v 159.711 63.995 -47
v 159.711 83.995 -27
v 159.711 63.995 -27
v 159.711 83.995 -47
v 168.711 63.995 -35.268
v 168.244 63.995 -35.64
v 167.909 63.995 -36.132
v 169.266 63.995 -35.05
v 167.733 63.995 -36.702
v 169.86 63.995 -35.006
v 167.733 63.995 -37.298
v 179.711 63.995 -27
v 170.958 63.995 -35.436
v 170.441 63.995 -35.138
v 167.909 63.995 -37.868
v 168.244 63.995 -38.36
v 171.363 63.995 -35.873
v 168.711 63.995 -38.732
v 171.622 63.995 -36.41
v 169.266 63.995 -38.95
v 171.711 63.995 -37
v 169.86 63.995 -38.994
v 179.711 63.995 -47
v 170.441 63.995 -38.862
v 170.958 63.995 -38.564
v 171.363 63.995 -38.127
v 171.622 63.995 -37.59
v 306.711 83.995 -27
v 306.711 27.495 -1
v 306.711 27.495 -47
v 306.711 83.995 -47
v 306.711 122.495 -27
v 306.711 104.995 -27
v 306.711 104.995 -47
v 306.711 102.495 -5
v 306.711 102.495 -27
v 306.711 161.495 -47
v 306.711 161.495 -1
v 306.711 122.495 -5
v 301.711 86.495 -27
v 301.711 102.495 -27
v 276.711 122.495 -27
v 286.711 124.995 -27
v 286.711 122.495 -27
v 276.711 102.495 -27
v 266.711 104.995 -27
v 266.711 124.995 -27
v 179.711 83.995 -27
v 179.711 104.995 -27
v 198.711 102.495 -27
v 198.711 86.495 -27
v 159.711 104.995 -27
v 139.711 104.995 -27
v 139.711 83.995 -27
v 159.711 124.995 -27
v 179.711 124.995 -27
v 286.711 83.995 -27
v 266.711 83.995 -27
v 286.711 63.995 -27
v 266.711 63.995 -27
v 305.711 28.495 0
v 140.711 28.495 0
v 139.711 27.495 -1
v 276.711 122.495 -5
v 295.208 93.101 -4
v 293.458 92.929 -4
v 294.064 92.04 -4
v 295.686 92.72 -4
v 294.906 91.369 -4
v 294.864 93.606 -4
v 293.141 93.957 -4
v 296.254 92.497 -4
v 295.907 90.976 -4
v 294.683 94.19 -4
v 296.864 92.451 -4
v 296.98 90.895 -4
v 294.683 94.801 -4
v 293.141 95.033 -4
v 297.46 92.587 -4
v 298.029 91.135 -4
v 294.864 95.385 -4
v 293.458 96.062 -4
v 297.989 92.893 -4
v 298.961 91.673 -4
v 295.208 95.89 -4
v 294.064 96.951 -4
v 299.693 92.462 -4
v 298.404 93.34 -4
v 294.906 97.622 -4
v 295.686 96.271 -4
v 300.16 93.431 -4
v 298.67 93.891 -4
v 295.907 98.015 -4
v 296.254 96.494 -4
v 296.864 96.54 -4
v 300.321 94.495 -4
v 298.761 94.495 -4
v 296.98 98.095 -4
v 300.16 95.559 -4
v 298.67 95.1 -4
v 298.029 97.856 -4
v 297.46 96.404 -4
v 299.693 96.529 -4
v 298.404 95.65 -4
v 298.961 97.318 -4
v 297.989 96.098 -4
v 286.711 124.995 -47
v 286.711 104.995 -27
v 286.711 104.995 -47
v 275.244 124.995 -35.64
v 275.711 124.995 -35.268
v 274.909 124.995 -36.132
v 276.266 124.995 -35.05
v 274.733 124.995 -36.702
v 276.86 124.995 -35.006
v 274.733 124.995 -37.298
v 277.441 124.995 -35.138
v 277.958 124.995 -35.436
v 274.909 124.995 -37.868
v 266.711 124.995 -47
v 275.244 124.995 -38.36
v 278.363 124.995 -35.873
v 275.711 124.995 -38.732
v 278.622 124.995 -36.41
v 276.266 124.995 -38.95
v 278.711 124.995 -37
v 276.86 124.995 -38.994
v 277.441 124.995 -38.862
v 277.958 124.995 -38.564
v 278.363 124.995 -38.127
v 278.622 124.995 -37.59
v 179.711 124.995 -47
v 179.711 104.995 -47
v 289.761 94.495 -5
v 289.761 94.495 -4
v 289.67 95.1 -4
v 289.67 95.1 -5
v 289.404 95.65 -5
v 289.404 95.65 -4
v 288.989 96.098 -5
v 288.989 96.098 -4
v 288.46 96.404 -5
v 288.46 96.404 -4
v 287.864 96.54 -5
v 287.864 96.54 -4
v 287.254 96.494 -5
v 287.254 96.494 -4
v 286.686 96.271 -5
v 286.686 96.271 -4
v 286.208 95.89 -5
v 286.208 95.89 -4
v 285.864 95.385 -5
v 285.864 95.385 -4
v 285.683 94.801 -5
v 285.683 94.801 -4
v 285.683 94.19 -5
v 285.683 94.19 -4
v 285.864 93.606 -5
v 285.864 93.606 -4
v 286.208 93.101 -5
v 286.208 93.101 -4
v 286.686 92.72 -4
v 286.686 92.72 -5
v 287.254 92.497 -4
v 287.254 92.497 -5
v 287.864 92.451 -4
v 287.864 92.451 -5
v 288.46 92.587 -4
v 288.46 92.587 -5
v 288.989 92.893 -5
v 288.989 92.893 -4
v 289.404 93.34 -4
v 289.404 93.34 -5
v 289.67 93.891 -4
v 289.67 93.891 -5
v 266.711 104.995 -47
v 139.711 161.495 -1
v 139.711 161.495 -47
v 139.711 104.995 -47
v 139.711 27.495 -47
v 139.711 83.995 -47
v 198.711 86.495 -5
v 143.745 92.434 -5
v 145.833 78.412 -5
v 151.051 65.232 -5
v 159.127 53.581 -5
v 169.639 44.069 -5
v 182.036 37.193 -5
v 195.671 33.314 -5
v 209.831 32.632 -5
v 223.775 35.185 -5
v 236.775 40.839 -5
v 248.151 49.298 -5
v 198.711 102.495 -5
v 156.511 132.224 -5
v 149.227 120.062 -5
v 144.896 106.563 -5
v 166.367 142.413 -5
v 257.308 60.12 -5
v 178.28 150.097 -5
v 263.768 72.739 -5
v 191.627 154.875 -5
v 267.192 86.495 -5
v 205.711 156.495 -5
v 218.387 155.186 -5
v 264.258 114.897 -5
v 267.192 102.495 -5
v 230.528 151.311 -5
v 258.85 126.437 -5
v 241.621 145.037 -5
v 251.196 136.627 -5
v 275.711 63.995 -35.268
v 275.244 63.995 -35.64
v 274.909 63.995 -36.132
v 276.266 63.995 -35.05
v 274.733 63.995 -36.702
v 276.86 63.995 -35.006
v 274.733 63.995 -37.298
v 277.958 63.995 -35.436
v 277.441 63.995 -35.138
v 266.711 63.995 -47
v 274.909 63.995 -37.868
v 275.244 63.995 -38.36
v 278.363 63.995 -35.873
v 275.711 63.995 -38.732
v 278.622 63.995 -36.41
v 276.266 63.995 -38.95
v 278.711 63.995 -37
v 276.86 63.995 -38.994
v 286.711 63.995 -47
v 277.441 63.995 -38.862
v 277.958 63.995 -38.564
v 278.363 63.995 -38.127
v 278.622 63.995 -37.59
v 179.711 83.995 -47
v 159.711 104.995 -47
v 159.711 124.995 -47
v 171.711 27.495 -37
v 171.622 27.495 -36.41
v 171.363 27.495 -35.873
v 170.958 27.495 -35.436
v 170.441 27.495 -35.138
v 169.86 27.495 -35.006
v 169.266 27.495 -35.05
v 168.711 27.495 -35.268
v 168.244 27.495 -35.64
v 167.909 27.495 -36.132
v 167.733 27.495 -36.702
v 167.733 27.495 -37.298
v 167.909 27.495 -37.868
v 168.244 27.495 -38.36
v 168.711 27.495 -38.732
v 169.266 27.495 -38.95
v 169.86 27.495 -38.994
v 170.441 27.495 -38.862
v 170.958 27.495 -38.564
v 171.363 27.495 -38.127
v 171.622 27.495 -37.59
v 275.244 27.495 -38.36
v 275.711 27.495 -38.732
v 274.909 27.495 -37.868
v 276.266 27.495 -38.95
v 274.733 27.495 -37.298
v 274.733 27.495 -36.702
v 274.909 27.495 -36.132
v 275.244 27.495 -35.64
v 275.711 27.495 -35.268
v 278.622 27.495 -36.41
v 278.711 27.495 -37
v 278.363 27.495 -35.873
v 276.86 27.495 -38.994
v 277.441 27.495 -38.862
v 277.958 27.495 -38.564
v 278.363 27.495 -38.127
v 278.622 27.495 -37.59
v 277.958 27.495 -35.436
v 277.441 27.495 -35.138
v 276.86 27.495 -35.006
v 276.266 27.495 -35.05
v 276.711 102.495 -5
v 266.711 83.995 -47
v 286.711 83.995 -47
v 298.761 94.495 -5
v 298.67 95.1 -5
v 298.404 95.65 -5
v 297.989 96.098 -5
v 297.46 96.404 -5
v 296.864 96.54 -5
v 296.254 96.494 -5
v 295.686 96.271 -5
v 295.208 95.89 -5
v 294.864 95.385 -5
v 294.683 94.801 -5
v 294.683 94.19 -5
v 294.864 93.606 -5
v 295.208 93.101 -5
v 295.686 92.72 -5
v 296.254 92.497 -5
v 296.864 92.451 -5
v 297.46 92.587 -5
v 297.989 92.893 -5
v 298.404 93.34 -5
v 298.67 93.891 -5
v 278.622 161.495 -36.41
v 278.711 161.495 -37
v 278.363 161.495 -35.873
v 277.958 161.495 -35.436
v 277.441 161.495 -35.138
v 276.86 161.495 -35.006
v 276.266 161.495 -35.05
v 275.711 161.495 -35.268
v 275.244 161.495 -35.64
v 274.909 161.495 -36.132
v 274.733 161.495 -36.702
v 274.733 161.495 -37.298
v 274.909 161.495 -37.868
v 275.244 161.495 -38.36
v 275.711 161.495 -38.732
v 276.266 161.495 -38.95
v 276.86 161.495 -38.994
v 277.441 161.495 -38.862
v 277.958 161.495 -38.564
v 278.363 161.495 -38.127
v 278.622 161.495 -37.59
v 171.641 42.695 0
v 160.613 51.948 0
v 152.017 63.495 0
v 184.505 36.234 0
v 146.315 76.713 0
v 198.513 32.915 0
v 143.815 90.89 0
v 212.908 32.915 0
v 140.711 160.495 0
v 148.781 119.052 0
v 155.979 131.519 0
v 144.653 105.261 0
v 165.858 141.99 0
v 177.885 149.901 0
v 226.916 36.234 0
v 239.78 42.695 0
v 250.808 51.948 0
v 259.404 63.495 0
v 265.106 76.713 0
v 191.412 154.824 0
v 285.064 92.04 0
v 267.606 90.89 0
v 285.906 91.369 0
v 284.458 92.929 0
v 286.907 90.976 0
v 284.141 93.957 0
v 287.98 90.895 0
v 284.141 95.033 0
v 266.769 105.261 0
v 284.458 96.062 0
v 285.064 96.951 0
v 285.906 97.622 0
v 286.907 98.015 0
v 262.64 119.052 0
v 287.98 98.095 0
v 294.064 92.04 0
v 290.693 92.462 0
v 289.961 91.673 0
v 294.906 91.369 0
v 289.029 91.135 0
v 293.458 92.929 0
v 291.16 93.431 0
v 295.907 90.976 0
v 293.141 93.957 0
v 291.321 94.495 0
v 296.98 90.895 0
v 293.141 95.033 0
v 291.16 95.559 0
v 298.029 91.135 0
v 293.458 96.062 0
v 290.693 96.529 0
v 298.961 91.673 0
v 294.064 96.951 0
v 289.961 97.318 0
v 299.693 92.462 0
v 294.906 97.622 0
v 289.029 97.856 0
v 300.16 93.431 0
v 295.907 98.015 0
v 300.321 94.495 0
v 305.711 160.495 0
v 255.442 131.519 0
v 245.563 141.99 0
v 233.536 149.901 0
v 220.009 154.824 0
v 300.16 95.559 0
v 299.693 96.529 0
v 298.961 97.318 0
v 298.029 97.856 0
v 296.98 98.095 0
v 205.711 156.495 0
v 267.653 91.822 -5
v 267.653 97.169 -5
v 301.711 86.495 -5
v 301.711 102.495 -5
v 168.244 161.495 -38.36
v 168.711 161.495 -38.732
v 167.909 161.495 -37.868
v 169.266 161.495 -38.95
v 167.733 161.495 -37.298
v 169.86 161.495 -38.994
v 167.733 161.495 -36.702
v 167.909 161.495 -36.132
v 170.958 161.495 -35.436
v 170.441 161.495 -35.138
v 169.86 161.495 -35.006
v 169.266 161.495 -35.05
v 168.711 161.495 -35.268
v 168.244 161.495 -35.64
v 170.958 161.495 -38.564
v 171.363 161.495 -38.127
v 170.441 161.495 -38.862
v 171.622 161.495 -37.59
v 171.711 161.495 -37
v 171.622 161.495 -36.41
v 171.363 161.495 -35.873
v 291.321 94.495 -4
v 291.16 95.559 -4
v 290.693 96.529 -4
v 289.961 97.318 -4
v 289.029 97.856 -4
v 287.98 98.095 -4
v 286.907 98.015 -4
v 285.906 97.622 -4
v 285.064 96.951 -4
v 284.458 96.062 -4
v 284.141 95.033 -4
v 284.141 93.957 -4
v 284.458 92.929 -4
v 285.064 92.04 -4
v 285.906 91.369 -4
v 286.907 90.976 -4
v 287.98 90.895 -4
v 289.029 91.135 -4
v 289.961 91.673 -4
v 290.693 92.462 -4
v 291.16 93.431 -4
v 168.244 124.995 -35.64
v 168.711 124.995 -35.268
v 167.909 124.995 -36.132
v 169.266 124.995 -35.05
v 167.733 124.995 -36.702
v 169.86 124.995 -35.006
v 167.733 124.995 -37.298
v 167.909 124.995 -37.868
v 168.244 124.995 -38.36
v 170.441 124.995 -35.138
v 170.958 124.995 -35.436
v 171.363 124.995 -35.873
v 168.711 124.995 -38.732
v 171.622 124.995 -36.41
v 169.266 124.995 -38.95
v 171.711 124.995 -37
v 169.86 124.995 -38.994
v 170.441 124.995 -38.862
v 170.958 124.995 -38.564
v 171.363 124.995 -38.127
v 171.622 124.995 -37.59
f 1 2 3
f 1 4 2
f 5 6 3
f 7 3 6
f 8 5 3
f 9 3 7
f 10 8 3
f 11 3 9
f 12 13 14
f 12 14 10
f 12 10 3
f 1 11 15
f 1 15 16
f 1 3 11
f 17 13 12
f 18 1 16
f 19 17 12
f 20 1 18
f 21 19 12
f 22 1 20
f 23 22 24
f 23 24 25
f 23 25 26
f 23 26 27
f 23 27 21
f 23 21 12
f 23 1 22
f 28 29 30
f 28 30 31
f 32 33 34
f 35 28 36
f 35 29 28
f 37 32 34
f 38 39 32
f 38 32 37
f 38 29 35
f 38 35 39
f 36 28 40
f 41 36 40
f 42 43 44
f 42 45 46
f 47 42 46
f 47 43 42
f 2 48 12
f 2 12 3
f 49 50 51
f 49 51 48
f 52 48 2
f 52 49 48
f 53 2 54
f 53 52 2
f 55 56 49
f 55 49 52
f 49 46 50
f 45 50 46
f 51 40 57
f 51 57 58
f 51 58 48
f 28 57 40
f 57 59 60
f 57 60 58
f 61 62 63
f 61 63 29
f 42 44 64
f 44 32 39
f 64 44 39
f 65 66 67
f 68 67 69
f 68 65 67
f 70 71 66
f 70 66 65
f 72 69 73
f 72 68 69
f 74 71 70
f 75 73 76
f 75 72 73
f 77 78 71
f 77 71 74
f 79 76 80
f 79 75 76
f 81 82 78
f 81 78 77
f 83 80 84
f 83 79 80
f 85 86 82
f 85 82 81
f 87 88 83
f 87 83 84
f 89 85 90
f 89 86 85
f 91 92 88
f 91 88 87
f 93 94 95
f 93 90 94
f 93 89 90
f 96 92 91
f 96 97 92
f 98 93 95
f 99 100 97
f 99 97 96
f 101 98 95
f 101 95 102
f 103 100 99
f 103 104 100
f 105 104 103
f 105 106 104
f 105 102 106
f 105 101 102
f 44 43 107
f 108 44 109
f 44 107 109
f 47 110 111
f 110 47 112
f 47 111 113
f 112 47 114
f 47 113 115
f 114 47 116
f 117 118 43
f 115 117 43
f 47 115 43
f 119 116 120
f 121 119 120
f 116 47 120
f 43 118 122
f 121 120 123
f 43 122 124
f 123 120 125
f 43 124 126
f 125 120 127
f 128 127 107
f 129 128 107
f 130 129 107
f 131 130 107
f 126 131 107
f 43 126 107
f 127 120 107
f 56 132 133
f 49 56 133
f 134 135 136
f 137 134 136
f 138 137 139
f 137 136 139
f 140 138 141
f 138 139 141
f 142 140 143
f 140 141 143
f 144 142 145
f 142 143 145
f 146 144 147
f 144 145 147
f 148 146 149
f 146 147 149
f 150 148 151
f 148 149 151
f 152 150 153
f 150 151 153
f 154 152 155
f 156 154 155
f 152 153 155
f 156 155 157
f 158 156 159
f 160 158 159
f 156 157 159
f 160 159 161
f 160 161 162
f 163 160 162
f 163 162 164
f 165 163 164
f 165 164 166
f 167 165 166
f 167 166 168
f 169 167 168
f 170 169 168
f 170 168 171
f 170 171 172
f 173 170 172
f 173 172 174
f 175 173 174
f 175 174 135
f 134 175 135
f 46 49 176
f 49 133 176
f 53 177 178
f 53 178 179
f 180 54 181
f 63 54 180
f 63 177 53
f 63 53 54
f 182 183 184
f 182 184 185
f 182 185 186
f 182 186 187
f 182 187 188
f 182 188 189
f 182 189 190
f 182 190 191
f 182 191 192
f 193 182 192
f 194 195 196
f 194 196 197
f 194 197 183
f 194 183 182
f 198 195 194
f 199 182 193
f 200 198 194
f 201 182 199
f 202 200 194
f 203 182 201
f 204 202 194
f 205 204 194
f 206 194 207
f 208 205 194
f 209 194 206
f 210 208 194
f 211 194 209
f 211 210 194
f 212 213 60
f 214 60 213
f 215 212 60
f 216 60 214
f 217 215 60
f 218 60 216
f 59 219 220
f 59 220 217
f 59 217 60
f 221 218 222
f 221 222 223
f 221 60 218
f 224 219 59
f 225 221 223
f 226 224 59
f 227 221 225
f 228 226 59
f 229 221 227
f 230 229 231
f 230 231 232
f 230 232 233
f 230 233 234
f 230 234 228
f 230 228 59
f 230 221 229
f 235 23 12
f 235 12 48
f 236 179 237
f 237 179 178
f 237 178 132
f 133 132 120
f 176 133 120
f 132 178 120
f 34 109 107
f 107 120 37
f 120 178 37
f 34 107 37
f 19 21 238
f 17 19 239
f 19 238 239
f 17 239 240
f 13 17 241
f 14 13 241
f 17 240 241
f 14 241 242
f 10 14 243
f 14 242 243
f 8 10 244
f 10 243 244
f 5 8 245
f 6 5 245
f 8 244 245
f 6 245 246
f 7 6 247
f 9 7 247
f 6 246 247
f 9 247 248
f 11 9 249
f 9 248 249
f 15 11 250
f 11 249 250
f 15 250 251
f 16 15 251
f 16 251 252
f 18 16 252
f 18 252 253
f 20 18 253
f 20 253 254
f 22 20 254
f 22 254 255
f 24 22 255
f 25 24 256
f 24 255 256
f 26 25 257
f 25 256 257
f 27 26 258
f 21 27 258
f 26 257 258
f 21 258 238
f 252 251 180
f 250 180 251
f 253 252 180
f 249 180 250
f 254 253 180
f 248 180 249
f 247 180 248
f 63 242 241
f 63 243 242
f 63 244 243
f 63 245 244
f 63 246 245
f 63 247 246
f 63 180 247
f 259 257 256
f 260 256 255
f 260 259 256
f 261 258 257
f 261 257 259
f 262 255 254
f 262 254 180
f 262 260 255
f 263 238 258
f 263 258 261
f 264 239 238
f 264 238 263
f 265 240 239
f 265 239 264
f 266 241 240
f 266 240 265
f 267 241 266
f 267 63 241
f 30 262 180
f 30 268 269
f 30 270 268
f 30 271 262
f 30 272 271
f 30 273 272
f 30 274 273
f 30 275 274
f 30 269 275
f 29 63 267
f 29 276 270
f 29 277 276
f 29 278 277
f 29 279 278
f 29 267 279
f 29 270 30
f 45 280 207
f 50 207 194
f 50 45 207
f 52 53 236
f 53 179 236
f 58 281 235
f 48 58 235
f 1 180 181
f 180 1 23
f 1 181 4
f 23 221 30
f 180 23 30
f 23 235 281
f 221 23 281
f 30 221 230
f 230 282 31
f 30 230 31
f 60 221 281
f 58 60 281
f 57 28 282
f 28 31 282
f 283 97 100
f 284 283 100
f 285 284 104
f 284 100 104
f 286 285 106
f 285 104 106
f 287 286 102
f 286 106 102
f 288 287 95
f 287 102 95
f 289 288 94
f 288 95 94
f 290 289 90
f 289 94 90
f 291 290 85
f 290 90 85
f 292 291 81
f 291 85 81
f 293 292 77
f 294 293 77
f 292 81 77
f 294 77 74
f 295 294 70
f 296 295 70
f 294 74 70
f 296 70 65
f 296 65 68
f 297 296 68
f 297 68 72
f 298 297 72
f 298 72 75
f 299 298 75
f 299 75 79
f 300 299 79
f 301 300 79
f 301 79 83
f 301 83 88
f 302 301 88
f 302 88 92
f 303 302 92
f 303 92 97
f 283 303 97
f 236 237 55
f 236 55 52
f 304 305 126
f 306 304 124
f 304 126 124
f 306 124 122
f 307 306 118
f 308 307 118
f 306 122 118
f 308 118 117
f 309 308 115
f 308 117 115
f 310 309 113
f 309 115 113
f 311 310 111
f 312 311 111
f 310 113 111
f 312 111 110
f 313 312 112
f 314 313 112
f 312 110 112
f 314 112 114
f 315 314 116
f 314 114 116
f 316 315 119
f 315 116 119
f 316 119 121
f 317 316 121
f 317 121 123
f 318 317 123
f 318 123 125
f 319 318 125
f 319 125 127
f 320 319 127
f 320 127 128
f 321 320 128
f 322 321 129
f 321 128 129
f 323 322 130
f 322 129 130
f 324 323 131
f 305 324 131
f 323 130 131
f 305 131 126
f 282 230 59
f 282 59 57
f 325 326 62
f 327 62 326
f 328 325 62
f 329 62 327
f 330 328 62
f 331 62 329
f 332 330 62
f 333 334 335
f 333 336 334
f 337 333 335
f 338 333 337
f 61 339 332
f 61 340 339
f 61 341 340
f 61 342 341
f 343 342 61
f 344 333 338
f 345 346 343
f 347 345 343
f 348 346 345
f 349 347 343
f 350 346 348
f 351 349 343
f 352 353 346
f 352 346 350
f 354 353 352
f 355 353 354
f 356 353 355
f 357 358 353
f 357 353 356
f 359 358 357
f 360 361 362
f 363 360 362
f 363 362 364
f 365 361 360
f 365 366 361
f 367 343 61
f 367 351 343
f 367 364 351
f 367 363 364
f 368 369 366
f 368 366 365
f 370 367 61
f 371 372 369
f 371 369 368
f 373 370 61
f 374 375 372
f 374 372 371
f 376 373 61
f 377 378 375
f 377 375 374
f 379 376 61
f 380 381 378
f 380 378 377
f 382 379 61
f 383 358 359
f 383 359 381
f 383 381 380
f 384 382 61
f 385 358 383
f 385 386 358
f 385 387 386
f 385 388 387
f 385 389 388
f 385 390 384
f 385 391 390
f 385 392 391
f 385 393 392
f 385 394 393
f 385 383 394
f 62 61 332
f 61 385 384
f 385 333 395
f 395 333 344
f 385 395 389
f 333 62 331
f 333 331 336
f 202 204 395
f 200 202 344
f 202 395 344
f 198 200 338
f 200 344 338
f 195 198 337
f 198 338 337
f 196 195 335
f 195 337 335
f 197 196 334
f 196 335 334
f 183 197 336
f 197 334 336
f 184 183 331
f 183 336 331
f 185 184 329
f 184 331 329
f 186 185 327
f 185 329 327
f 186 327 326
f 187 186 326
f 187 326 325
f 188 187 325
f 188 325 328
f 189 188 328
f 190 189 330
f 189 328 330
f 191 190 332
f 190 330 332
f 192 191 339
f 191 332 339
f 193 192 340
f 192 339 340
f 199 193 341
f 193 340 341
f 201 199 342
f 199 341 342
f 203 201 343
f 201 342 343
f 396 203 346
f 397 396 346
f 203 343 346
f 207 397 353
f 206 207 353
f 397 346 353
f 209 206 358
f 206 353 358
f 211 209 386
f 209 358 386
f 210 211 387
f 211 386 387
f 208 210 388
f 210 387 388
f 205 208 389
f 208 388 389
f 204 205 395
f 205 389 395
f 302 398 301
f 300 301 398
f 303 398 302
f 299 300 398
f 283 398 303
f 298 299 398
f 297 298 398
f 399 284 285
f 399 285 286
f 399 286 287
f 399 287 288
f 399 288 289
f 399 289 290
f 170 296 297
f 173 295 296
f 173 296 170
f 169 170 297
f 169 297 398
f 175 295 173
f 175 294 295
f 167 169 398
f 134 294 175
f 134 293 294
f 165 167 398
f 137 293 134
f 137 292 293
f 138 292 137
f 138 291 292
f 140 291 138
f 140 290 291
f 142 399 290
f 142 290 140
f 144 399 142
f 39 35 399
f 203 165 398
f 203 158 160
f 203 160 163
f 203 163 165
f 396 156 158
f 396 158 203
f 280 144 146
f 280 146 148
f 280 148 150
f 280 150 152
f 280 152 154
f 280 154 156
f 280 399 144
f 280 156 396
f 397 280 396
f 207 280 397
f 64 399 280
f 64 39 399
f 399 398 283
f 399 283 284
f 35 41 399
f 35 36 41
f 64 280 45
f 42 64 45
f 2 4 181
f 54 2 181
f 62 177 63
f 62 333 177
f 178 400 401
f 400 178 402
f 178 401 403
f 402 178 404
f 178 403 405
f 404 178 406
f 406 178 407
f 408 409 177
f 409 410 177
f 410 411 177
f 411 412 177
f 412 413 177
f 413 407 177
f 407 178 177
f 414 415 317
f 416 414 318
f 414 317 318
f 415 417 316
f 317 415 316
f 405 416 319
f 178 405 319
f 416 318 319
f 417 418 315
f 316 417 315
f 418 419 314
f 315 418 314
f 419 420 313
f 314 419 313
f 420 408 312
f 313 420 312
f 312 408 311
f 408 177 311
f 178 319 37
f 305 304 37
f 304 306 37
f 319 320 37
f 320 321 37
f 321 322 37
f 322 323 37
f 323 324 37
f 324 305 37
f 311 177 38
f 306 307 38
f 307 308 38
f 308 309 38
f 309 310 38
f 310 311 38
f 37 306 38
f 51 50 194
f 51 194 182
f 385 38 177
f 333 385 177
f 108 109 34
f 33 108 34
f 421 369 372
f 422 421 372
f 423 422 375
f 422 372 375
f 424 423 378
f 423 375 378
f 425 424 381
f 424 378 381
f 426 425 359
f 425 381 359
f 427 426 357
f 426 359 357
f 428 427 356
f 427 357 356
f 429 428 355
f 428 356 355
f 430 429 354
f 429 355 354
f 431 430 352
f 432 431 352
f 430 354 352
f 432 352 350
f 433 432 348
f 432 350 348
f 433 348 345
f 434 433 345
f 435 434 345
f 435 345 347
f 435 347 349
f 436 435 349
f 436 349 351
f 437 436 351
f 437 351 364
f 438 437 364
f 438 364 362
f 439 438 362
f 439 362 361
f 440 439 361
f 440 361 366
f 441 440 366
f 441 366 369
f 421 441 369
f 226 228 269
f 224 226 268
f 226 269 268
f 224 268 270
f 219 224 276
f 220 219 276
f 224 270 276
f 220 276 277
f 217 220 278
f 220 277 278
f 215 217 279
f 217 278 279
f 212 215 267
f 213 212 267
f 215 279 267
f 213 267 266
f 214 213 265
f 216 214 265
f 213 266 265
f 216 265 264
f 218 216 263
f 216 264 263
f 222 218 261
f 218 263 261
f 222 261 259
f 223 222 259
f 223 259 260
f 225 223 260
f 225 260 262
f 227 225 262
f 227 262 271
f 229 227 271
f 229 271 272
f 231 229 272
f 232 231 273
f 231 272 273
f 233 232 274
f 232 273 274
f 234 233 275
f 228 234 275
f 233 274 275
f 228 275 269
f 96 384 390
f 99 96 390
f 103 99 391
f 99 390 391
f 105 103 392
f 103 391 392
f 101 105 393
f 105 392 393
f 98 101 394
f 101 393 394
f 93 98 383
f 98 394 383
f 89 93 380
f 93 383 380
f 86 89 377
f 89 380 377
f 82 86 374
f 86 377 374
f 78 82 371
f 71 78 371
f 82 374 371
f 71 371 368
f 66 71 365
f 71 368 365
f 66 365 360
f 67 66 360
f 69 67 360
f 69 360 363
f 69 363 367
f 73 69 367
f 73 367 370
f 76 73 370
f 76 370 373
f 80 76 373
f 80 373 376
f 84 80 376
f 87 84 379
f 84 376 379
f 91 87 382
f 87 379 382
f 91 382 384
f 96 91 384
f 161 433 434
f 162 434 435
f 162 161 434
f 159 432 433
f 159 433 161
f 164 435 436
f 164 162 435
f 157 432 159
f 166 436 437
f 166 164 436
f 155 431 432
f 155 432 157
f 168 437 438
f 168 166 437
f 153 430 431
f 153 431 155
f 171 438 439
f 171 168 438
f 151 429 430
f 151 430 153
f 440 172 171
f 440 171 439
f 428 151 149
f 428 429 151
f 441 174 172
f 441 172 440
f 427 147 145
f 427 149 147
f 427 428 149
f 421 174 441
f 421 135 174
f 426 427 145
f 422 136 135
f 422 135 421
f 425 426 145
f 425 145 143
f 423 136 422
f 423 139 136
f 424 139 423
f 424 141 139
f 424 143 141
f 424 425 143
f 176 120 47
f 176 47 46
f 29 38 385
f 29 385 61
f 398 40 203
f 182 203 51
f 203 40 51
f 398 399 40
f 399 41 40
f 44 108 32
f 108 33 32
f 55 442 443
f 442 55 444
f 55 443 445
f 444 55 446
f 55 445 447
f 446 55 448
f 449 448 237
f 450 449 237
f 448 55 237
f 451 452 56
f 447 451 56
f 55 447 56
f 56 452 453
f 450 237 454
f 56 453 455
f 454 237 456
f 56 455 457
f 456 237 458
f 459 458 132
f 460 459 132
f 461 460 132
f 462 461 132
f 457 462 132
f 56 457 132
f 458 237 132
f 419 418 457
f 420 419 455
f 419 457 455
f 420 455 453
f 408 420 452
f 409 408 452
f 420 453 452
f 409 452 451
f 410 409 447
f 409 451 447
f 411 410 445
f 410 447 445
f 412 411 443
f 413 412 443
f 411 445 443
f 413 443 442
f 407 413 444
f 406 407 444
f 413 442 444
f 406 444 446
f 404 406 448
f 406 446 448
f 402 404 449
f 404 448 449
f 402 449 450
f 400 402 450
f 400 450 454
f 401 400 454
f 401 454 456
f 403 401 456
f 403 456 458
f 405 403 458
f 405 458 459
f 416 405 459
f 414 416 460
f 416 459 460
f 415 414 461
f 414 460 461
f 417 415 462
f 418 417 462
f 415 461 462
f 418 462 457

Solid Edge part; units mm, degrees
sketch "Sketch1" plane through (0, 0, 0) normal (0, 0, 1) x (1, 0, 0)
  line L0 (139.7106, 161.4953) -> (139.7106, 27.4953)
  line L1 (139.7106, 27.4953) -> (306.7106, 27.4953)
  line L2 (306.7106, 27.4953) -> (306.7106, 161.4953)
  line L3 (139.7106, 161.4953) -> (306.7106, 161.4953)
  dimension "D1" = 134
  dimension "D2" = 167
  dimension "D3" = 134
extrude "Protrusion1" add sketch "Sketch1" against normal blind 47
sketch "Sketch2" plane through (223.2106, 94.4953, -47) normal (0, 0, -1) x (1, 0, 0)
  line L0 (83.5, 0) -> (83.5, 10.5)
  line L1 (83.5, 10.5) -> (-83.5, 10.5)
  line L2 (-83.5, 10.5) -> (-83.5, 0)
  line L3 (-83.5, 0) -> (-83.5, -10.5)
  line L4 (-83.5, -10.5) -> (83.5, -10.5)
  line L5 (83.5, 0) -> (83.5, -10.5)
  dimension "D1" = 10.5
  dimension "D2" = 10.5
  dimension "D3" = 10.5
extrude "ExtrudedCutout_1" cut sketch "Sketch2" against normal blind 20
sketch "Sketch3" plane through (223.2106, 94.4953, 0) normal (0, 0, 1) x (1, 0, 0)
  circle A0 centre (73.5, 0) radius 2.05
  circle A1 centre (64.5, 0) radius 2.05
  circle A2 centre (-17.5, 0) radius 2.05
  dimension "D1" = 4.1
  dimension "D2" = 4.1
  dimension "D3" = 10
  dimension "D4" = 9
  dimension "D5" = 4.1
  dimension "D6" = 82
extrude "Cutout1" cut sketch "Sketch3" against normal through all
sketch "Sketch4" plane through (223.2106, 94.4953, -27) normal (0, 0, -1) x (-1, 0, 0)
  line L0 (-78.5, 8) -> (-78.5, -8)
  line L1 (-78.5, -8) -> (24.5, -8)
  line L2 (24.5, 8) -> (24.5, -8)
  line L3 (-78.5, 8) -> (24.5, 8)
  dimension "D1" = 5
  dimension "D2" = 2.5
  dimension "D3" = 2.5
  dimension "D4" = 103
  dimension "D5" = 16
extrude "ExtrudedCutout_3" cut sketch "Sketch4" against normal blind 22
sketch "Sketch5" plane through (223.2106, 94.4953, 0) normal (0, 0, 1) x (0, 1, 0)
  circle A0 centre (0, 17.5) radius 62
  dimension "D1" = 124
extrude "ExtrudedCutout_4" cut sketch "Sketch5" against normal blind 5
chamfer "Chamfer_1" distance 1 angle 45 1 edges at (139.7106, 94.4953, 0)
chamfer "Chamfer_2" distance 1 angle 45 1 edges at (223.7106, 27.4953, 0)
chamfer "Chamfer_3" distance 1 angle 45 1 edges at (306.7106, 94.9953, 0)
chamfer "Chamfer_4" distance 1 angle 45 1 edges at (223.2106, 161.4953, 0)
sketch "Sketch6" plane through (223.2106, 94.4953, 0) normal (0, 0, 1) x (1, 0, 0)
  circle A0 centre (64.5, 0) radius 3.61
  circle A1 centre (73.5, 0) radius 3.61
extrude "ExtrudedCutout_5" cut sketch "Sketch6" against normal blind 4
sketch "Sketch7" plane through (306.7106, 94.4953, -24) normal (1, 0, 0) x (0, 1, 0)
  line L0 (8, -3) -> (8, 19)
  line L1 (28, 19) -> (8, 19)
  line L2 (28, -3) -> (28, 19)
  line L3 (8, -3) -> (28, -3)
  dimension "D1" = 20
extrude "ExtrudedCutout_6" cut sketch "Sketch7" against normal blind 30
sketch "Sketch8" plane through (223.2106, 55.7453, -47) normal (0, 0, -1) x (1, 0, 0)
  line L0 (-63.5, -8.25) -> (-43.5, -8.25)
  line L1 (-43.5, -8.25) -> (-43.5, -28.25)
  line L2 (-43.5, -28.25) -> (-63.5, -28.25)
  line L3 (-63.5, -28.25) -> (-63.5, -8.25)
  line L4 (-63.5, -69.25) -> (-43.5, -69.25)
  line L5 (-43.5, -69.25) -> (-43.5, -49.25)
  line L6 (-43.5, -49.25) -> (-63.5, -49.25)
  line L7 (-63.5, -69.25) -> (-63.5, -49.25)
  dimension "D1" = 20
  dimension "D2" = 20
  dimension "D3" = 20
  dimension "D4" = 20
  dimension "D5" = 20
  dimension "D6" = 20
  dimension "D7" = 20
extrude "ExtrudedCutout_9" cut sketch "Sketch8" against normal blind 20
sketch "Sketch9" plane through (223.2106, 55.7453, -47) normal (0, 0, -1) x (1, 0, 0)
  line L0 (43.5, -8.25) -> (63.5, -8.25)
  line L1 (63.5, -8.25) -> (63.5, -28.25)
  line L2 (43.5, -28.25) -> (63.5, -28.25)
  line L3 (43.5, -8.25) -> (43.5, -28.25)
  line L4 (43.5, -69.25) -> (63.5, -69.25)
  line L5 (63.5, -69.25) -> (63.5, -49.25)
  line L6 (43.5, -49.25) -> (63.5, -49.25)
  line L7 (43.5, -69.25) -> (43.5, -49.25)
  dimension "D1" = 20
  dimension "D2" = 20
  dimension "D3" = 20
  dimension "D4" = 20
  dimension "D5" = 20
  dimension "D6" = 20
extrude "ExtrudedCutout_10" cut sketch "Sketch9" against normal blind 20
sketch "Sketch10" plane through (223.2106, 27.4953, -24) normal (0, -1, 0) x (1, 0, 0)
  circle A0 centre (-53.5, -13) radius 2
extrude "Cutout2" cut sketch "Sketch10" against normal through all
sketch "Sketch11" plane through (223.2106, 27.4953, -24) normal (0, -1, 0) x (1, 0, 0)
  circle A0 centre (53.5, -13) radius 2
extrude "Cutout3" cut sketch "Sketch11" against normal through all
